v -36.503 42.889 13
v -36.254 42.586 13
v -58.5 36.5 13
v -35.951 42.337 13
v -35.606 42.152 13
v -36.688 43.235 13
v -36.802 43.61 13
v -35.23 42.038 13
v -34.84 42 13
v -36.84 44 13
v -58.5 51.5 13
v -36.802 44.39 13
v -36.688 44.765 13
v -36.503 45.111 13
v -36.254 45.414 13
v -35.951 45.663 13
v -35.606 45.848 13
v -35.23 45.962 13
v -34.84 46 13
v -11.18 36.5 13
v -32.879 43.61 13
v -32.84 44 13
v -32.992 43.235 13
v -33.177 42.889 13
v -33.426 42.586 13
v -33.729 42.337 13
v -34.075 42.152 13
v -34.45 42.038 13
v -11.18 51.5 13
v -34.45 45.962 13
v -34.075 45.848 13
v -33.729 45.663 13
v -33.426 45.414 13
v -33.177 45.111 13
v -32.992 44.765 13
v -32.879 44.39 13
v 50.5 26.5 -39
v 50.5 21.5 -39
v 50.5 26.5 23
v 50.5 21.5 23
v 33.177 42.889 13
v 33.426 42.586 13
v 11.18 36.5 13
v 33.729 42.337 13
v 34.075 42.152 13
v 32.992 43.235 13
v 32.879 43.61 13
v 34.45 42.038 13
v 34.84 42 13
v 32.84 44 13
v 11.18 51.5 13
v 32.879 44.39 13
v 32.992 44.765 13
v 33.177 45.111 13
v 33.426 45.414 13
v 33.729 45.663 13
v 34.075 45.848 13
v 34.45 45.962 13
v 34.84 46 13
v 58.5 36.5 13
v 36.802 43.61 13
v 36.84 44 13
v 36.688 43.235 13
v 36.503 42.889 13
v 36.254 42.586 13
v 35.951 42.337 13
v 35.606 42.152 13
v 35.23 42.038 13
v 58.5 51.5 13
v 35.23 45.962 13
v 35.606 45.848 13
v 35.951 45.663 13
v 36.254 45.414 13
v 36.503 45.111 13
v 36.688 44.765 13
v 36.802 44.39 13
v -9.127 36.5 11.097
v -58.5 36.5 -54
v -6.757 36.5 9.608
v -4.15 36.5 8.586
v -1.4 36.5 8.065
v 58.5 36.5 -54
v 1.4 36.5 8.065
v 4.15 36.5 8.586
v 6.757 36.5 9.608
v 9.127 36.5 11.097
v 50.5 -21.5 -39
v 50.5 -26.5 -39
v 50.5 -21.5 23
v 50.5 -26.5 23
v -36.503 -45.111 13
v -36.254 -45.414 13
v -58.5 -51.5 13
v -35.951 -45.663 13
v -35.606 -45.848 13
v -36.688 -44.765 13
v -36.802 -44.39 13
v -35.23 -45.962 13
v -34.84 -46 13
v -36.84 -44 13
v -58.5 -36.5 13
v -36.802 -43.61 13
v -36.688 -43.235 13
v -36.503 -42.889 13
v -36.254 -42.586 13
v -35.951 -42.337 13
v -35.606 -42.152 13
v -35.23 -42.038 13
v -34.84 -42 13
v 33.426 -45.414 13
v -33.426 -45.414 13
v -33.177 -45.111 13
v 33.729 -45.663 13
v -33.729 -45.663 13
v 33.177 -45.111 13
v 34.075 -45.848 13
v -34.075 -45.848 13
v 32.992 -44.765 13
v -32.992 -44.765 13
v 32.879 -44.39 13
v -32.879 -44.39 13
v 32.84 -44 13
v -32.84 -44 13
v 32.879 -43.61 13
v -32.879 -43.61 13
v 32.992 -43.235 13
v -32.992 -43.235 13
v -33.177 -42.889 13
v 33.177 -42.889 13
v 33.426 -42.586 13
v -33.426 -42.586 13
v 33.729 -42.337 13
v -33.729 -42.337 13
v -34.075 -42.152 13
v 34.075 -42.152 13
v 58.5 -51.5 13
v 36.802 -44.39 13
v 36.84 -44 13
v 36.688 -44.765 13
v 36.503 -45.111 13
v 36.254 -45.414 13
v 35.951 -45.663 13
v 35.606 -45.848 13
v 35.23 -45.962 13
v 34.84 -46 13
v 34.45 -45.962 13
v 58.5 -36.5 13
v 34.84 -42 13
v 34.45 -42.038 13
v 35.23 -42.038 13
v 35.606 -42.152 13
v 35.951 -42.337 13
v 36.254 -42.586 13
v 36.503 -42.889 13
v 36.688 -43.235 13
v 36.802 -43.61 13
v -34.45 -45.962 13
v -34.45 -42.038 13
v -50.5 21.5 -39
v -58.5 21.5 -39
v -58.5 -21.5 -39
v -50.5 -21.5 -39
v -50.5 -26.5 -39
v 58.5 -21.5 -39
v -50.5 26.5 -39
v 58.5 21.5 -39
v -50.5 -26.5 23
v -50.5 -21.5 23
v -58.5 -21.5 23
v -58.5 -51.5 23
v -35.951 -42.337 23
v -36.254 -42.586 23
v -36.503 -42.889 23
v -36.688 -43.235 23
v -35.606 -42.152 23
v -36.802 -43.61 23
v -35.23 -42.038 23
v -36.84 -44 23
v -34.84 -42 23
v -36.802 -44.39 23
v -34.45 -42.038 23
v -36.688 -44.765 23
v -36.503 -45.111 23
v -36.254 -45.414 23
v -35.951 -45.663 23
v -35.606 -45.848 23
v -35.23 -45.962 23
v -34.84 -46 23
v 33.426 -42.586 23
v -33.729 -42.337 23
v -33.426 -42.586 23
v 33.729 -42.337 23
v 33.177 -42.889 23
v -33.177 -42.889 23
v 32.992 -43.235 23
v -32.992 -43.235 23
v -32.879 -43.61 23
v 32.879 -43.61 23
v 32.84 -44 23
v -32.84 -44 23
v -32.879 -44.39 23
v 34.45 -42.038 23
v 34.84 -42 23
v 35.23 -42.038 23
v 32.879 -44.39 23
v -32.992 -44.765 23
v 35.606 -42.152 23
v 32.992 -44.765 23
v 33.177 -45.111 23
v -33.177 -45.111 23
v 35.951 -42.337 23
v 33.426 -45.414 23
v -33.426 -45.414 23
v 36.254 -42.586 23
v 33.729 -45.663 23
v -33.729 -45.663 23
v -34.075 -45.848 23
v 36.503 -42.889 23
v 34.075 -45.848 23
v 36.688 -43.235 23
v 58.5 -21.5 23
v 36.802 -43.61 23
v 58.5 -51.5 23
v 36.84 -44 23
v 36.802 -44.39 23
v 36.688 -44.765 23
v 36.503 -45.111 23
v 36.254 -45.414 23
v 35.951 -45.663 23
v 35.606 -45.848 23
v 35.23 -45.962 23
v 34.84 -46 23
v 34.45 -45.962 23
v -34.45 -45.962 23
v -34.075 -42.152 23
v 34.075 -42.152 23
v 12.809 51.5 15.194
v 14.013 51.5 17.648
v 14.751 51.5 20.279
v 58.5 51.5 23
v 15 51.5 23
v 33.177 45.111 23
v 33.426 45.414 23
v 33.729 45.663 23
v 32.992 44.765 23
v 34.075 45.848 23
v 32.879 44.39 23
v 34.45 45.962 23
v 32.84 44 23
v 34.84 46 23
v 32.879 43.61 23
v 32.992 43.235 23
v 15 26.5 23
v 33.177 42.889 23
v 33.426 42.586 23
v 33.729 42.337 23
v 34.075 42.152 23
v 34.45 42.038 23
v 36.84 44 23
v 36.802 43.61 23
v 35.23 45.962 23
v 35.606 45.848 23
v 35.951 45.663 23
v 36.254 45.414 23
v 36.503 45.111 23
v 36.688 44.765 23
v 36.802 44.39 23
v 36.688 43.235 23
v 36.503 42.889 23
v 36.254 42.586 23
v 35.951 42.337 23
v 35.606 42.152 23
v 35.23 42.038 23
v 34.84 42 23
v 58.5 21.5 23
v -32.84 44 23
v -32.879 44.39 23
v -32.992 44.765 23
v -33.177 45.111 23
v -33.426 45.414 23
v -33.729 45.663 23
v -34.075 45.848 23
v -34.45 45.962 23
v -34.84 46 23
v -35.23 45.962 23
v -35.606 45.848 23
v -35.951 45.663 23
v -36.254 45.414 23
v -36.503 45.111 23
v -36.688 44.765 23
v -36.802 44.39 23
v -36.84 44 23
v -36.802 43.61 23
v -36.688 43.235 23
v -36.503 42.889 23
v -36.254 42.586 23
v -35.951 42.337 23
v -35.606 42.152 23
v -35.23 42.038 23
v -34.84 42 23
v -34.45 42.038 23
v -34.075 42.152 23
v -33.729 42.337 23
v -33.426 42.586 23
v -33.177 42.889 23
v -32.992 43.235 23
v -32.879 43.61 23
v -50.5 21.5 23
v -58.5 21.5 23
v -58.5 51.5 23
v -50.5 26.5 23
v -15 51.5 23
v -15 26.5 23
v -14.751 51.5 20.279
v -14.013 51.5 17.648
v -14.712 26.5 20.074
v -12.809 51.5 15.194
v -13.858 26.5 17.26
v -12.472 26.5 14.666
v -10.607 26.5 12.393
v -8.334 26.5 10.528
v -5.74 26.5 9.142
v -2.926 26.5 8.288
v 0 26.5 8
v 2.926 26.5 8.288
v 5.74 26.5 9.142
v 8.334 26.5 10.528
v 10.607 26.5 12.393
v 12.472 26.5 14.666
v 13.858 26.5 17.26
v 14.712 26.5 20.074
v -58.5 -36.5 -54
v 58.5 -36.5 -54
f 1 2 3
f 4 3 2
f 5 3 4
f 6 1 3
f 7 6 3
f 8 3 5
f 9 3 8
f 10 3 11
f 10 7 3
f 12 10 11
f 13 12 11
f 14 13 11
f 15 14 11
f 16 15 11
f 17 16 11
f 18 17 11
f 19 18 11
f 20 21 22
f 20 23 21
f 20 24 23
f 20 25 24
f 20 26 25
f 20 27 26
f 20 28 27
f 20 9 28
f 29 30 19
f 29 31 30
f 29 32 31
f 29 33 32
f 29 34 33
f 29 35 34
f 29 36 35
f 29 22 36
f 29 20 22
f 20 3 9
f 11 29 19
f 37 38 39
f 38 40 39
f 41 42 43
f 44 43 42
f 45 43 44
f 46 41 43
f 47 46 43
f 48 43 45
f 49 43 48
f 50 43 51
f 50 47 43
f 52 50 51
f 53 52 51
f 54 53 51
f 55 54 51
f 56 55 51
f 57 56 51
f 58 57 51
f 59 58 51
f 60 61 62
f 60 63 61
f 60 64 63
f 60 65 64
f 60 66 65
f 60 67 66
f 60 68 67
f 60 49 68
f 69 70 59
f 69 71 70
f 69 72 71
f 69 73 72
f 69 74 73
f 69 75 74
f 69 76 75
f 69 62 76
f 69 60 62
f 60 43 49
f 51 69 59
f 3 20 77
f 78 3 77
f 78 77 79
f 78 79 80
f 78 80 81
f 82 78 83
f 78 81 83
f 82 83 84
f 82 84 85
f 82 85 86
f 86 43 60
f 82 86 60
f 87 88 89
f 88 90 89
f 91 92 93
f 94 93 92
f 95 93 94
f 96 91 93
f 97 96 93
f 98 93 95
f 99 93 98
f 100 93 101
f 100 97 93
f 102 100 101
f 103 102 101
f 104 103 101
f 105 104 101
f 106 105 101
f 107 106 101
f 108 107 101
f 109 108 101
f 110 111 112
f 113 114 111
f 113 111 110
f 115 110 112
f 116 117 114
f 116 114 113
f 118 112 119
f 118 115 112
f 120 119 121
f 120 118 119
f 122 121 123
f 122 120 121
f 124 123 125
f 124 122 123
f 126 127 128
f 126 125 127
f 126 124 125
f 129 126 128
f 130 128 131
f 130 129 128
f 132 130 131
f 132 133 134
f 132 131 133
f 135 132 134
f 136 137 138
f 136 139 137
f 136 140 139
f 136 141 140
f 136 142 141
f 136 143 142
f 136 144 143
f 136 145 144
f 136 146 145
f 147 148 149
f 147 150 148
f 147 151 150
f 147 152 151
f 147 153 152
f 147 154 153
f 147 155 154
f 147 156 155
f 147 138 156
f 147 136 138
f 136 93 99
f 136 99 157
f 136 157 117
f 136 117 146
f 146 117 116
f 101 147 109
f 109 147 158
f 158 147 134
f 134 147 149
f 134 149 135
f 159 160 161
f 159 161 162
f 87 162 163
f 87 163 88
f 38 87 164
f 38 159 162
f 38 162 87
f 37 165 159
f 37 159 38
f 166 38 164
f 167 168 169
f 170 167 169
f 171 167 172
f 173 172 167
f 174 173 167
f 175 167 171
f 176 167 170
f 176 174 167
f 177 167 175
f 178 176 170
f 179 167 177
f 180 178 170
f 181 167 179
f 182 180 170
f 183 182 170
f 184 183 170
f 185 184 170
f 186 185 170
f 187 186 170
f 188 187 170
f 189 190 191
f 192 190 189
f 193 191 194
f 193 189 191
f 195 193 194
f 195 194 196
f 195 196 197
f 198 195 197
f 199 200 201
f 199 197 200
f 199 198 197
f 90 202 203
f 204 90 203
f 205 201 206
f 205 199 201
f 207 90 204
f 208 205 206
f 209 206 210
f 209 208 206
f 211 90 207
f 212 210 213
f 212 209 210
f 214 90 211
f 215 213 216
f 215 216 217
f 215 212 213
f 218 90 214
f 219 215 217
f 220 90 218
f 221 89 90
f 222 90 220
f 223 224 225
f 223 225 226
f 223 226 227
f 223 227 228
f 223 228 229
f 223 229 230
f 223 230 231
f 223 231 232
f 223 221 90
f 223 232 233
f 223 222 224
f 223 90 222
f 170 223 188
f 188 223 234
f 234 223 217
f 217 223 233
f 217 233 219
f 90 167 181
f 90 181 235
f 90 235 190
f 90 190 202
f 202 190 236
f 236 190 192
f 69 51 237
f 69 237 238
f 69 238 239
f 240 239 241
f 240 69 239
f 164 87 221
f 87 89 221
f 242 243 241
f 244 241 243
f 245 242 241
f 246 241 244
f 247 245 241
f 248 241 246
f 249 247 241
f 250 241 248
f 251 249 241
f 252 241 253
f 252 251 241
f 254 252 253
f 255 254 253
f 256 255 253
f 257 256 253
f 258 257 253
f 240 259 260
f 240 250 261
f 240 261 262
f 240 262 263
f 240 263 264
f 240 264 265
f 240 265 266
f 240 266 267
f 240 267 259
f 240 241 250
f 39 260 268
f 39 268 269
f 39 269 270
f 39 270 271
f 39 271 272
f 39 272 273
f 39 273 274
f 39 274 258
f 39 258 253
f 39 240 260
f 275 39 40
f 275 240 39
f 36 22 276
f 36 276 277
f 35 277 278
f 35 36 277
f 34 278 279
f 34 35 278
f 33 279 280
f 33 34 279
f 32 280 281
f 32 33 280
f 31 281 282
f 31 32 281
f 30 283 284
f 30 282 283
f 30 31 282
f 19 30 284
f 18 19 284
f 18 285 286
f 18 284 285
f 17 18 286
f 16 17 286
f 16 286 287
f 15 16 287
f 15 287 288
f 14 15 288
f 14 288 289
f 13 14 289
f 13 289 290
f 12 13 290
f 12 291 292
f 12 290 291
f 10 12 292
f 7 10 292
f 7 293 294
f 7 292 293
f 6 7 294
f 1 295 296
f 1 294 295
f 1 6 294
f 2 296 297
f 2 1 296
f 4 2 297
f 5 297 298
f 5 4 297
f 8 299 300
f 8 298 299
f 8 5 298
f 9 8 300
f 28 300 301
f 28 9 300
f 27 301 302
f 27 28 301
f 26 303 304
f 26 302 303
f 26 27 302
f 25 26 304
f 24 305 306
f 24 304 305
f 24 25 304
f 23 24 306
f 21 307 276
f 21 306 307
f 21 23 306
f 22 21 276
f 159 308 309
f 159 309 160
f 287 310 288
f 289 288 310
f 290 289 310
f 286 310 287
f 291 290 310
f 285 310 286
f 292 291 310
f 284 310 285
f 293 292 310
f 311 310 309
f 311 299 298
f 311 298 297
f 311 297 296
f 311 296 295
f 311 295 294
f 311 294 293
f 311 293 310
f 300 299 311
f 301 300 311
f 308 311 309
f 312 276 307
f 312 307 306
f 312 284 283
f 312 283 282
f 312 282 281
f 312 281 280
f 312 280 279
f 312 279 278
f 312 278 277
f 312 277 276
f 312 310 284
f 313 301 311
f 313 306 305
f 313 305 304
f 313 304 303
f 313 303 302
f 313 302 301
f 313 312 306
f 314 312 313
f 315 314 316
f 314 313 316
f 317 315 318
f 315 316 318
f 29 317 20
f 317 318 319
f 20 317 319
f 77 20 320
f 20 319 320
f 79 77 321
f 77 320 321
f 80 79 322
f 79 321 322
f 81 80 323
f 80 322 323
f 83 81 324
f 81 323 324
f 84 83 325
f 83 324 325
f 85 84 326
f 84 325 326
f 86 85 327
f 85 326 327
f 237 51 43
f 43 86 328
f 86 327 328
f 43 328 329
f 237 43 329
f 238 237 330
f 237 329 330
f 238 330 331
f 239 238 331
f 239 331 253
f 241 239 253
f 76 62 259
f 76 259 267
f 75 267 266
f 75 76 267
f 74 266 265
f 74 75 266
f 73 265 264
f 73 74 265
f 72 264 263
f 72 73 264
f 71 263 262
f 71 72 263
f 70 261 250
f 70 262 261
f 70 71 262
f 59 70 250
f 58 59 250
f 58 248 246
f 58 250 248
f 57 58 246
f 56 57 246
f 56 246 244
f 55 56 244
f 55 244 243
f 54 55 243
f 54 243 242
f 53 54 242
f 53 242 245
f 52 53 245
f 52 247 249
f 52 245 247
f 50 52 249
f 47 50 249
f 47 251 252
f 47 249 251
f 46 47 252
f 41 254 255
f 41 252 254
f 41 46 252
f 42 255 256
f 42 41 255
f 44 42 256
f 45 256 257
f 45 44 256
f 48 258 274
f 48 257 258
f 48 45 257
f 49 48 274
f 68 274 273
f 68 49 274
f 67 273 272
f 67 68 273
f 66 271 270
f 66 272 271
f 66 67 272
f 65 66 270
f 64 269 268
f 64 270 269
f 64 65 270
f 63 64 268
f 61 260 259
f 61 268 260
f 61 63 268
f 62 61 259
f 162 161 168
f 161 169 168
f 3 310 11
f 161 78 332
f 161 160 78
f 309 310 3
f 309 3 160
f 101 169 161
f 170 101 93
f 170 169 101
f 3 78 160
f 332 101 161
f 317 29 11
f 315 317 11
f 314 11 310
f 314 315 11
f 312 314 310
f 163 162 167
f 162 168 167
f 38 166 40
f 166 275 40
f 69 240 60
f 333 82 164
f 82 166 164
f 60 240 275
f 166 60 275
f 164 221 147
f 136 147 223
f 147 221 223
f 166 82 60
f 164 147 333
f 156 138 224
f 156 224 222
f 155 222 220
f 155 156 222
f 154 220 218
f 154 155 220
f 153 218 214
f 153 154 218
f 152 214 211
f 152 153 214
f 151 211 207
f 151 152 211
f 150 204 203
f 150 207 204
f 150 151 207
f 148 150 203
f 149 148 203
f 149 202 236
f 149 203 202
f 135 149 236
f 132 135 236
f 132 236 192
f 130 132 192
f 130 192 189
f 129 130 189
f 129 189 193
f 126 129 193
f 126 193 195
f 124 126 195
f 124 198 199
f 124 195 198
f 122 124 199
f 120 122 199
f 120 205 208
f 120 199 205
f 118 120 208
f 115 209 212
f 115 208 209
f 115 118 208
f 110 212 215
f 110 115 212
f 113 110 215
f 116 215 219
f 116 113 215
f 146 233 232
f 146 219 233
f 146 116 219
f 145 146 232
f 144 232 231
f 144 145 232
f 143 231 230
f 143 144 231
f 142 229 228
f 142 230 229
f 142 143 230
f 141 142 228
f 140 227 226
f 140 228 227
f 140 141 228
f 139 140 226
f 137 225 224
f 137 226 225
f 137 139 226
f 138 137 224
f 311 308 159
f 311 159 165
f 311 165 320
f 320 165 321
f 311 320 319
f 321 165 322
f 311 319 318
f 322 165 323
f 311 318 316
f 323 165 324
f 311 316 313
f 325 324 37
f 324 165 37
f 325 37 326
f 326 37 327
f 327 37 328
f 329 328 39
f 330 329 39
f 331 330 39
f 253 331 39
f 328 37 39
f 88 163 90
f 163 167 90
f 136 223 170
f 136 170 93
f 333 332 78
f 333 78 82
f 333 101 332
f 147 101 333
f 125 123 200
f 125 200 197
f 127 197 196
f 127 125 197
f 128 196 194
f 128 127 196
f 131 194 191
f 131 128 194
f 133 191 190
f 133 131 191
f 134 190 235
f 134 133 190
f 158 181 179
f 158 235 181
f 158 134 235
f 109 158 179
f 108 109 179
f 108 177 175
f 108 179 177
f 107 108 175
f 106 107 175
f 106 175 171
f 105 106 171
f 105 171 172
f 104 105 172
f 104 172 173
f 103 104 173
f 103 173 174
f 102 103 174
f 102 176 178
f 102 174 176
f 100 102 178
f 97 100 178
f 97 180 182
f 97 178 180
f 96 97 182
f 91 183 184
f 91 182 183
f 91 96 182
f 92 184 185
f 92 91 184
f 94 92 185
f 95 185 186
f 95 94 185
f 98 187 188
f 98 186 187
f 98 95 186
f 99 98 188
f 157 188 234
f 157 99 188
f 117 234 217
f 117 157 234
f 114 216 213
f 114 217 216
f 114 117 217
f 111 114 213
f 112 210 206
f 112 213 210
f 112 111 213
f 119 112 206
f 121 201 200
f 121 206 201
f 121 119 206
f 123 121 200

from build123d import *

# Parameters (mm, degrees)
F1_DEPTH  = 58.5
F3_DEPTH  = 136.4
F4_R      = 2
F5_DEPTH  = 25
F6_W      = 5
F6_H      = 31
F7_DEPTH  = 50.5
F8_W      = 117
F8_H      = 73
F9_DEPTH  = 31
F11_DEPTH = 31


with BuildPart() as f1:
    # F0 (on Right) → F1 (new body, symmetric)
    with BuildSketch(Plane.YZ):
        Polygon((51.5, 23), (36.5, 23), (21.5, 23), (21.5, -8), (0, -8), (-21.5, -8), (-21.5, 23), (-36.5, 23), (-51.5, 23), (-51.5, 13), (-36.5, 13), (-36.5, -23), (36.5, -23), (36.5, 13), (51.5, 13), align=None)
    extrude(amount=F1_DEPTH, both=True)

    # F2 (on Front) → F3 (cut)
    with BuildSketch(Plane.XZ):
        with BuildLine():
            ThreePointArc((-15, 23), (0, 8), (15, 23))
            Line((15, 23), (-15, 23))
        make_face()
    extrude(amount=-F3_DEPTH, mode=Mode.SUBTRACT)

    # F4 (on Top) → F5 (cut)
    with BuildSketch(Plane.XY):
        with Locations((-34.84017, -44)):
            Circle(F4_R)
        with Locations((34.84017, -44)):
            Circle(F4_R)
        with Locations((-34.84017, 44)):
            Circle(F4_R)
        with Locations((34.84017, 44)):
            Circle(F4_R)
    extrude(amount=F5_DEPTH, mode=Mode.SUBTRACT)

    # F6 (on Right) → F7 (cut, symmetric)
    with BuildSketch(Plane.YZ):
        with Locations((-24, 7.5)):
            Rectangle(F6_W, F6_H)
        with Locations((24, 7.5)):
            Rectangle(F6_W, F6_H)
    extrude(amount=F7_DEPTH, both=True, mode=Mode.SUBTRACT)

    # F8 (on face) → F9 (join)
    with BuildSketch(Plane(origin=(0, 0, -23), x_dir=(1, 0, 0), z_dir=(0, 0, -1))):
        Rectangle(F8_W, F8_H)
    extrude(amount=F9_DEPTH)

    # F10 (on face) → F11 (cut)
    with BuildSketch(Plane.XY.offset(-8)):
        Polygon((-50.5, 21.5), (-58.5, 21.5), (-58.5, -21.5), (-50.5, -21.5), (-50.5, -26.5), (50.5, -26.5), (50.5, -21.5), (58.5, -21.5), (58.5, 21.5), (50.5, 21.5), (50.5, 26.5), (-50.5, 26.5), align=None)
    extrude(amount=-F11_DEPTH, mode=Mode.SUBTRACT)


solid = f1.part
